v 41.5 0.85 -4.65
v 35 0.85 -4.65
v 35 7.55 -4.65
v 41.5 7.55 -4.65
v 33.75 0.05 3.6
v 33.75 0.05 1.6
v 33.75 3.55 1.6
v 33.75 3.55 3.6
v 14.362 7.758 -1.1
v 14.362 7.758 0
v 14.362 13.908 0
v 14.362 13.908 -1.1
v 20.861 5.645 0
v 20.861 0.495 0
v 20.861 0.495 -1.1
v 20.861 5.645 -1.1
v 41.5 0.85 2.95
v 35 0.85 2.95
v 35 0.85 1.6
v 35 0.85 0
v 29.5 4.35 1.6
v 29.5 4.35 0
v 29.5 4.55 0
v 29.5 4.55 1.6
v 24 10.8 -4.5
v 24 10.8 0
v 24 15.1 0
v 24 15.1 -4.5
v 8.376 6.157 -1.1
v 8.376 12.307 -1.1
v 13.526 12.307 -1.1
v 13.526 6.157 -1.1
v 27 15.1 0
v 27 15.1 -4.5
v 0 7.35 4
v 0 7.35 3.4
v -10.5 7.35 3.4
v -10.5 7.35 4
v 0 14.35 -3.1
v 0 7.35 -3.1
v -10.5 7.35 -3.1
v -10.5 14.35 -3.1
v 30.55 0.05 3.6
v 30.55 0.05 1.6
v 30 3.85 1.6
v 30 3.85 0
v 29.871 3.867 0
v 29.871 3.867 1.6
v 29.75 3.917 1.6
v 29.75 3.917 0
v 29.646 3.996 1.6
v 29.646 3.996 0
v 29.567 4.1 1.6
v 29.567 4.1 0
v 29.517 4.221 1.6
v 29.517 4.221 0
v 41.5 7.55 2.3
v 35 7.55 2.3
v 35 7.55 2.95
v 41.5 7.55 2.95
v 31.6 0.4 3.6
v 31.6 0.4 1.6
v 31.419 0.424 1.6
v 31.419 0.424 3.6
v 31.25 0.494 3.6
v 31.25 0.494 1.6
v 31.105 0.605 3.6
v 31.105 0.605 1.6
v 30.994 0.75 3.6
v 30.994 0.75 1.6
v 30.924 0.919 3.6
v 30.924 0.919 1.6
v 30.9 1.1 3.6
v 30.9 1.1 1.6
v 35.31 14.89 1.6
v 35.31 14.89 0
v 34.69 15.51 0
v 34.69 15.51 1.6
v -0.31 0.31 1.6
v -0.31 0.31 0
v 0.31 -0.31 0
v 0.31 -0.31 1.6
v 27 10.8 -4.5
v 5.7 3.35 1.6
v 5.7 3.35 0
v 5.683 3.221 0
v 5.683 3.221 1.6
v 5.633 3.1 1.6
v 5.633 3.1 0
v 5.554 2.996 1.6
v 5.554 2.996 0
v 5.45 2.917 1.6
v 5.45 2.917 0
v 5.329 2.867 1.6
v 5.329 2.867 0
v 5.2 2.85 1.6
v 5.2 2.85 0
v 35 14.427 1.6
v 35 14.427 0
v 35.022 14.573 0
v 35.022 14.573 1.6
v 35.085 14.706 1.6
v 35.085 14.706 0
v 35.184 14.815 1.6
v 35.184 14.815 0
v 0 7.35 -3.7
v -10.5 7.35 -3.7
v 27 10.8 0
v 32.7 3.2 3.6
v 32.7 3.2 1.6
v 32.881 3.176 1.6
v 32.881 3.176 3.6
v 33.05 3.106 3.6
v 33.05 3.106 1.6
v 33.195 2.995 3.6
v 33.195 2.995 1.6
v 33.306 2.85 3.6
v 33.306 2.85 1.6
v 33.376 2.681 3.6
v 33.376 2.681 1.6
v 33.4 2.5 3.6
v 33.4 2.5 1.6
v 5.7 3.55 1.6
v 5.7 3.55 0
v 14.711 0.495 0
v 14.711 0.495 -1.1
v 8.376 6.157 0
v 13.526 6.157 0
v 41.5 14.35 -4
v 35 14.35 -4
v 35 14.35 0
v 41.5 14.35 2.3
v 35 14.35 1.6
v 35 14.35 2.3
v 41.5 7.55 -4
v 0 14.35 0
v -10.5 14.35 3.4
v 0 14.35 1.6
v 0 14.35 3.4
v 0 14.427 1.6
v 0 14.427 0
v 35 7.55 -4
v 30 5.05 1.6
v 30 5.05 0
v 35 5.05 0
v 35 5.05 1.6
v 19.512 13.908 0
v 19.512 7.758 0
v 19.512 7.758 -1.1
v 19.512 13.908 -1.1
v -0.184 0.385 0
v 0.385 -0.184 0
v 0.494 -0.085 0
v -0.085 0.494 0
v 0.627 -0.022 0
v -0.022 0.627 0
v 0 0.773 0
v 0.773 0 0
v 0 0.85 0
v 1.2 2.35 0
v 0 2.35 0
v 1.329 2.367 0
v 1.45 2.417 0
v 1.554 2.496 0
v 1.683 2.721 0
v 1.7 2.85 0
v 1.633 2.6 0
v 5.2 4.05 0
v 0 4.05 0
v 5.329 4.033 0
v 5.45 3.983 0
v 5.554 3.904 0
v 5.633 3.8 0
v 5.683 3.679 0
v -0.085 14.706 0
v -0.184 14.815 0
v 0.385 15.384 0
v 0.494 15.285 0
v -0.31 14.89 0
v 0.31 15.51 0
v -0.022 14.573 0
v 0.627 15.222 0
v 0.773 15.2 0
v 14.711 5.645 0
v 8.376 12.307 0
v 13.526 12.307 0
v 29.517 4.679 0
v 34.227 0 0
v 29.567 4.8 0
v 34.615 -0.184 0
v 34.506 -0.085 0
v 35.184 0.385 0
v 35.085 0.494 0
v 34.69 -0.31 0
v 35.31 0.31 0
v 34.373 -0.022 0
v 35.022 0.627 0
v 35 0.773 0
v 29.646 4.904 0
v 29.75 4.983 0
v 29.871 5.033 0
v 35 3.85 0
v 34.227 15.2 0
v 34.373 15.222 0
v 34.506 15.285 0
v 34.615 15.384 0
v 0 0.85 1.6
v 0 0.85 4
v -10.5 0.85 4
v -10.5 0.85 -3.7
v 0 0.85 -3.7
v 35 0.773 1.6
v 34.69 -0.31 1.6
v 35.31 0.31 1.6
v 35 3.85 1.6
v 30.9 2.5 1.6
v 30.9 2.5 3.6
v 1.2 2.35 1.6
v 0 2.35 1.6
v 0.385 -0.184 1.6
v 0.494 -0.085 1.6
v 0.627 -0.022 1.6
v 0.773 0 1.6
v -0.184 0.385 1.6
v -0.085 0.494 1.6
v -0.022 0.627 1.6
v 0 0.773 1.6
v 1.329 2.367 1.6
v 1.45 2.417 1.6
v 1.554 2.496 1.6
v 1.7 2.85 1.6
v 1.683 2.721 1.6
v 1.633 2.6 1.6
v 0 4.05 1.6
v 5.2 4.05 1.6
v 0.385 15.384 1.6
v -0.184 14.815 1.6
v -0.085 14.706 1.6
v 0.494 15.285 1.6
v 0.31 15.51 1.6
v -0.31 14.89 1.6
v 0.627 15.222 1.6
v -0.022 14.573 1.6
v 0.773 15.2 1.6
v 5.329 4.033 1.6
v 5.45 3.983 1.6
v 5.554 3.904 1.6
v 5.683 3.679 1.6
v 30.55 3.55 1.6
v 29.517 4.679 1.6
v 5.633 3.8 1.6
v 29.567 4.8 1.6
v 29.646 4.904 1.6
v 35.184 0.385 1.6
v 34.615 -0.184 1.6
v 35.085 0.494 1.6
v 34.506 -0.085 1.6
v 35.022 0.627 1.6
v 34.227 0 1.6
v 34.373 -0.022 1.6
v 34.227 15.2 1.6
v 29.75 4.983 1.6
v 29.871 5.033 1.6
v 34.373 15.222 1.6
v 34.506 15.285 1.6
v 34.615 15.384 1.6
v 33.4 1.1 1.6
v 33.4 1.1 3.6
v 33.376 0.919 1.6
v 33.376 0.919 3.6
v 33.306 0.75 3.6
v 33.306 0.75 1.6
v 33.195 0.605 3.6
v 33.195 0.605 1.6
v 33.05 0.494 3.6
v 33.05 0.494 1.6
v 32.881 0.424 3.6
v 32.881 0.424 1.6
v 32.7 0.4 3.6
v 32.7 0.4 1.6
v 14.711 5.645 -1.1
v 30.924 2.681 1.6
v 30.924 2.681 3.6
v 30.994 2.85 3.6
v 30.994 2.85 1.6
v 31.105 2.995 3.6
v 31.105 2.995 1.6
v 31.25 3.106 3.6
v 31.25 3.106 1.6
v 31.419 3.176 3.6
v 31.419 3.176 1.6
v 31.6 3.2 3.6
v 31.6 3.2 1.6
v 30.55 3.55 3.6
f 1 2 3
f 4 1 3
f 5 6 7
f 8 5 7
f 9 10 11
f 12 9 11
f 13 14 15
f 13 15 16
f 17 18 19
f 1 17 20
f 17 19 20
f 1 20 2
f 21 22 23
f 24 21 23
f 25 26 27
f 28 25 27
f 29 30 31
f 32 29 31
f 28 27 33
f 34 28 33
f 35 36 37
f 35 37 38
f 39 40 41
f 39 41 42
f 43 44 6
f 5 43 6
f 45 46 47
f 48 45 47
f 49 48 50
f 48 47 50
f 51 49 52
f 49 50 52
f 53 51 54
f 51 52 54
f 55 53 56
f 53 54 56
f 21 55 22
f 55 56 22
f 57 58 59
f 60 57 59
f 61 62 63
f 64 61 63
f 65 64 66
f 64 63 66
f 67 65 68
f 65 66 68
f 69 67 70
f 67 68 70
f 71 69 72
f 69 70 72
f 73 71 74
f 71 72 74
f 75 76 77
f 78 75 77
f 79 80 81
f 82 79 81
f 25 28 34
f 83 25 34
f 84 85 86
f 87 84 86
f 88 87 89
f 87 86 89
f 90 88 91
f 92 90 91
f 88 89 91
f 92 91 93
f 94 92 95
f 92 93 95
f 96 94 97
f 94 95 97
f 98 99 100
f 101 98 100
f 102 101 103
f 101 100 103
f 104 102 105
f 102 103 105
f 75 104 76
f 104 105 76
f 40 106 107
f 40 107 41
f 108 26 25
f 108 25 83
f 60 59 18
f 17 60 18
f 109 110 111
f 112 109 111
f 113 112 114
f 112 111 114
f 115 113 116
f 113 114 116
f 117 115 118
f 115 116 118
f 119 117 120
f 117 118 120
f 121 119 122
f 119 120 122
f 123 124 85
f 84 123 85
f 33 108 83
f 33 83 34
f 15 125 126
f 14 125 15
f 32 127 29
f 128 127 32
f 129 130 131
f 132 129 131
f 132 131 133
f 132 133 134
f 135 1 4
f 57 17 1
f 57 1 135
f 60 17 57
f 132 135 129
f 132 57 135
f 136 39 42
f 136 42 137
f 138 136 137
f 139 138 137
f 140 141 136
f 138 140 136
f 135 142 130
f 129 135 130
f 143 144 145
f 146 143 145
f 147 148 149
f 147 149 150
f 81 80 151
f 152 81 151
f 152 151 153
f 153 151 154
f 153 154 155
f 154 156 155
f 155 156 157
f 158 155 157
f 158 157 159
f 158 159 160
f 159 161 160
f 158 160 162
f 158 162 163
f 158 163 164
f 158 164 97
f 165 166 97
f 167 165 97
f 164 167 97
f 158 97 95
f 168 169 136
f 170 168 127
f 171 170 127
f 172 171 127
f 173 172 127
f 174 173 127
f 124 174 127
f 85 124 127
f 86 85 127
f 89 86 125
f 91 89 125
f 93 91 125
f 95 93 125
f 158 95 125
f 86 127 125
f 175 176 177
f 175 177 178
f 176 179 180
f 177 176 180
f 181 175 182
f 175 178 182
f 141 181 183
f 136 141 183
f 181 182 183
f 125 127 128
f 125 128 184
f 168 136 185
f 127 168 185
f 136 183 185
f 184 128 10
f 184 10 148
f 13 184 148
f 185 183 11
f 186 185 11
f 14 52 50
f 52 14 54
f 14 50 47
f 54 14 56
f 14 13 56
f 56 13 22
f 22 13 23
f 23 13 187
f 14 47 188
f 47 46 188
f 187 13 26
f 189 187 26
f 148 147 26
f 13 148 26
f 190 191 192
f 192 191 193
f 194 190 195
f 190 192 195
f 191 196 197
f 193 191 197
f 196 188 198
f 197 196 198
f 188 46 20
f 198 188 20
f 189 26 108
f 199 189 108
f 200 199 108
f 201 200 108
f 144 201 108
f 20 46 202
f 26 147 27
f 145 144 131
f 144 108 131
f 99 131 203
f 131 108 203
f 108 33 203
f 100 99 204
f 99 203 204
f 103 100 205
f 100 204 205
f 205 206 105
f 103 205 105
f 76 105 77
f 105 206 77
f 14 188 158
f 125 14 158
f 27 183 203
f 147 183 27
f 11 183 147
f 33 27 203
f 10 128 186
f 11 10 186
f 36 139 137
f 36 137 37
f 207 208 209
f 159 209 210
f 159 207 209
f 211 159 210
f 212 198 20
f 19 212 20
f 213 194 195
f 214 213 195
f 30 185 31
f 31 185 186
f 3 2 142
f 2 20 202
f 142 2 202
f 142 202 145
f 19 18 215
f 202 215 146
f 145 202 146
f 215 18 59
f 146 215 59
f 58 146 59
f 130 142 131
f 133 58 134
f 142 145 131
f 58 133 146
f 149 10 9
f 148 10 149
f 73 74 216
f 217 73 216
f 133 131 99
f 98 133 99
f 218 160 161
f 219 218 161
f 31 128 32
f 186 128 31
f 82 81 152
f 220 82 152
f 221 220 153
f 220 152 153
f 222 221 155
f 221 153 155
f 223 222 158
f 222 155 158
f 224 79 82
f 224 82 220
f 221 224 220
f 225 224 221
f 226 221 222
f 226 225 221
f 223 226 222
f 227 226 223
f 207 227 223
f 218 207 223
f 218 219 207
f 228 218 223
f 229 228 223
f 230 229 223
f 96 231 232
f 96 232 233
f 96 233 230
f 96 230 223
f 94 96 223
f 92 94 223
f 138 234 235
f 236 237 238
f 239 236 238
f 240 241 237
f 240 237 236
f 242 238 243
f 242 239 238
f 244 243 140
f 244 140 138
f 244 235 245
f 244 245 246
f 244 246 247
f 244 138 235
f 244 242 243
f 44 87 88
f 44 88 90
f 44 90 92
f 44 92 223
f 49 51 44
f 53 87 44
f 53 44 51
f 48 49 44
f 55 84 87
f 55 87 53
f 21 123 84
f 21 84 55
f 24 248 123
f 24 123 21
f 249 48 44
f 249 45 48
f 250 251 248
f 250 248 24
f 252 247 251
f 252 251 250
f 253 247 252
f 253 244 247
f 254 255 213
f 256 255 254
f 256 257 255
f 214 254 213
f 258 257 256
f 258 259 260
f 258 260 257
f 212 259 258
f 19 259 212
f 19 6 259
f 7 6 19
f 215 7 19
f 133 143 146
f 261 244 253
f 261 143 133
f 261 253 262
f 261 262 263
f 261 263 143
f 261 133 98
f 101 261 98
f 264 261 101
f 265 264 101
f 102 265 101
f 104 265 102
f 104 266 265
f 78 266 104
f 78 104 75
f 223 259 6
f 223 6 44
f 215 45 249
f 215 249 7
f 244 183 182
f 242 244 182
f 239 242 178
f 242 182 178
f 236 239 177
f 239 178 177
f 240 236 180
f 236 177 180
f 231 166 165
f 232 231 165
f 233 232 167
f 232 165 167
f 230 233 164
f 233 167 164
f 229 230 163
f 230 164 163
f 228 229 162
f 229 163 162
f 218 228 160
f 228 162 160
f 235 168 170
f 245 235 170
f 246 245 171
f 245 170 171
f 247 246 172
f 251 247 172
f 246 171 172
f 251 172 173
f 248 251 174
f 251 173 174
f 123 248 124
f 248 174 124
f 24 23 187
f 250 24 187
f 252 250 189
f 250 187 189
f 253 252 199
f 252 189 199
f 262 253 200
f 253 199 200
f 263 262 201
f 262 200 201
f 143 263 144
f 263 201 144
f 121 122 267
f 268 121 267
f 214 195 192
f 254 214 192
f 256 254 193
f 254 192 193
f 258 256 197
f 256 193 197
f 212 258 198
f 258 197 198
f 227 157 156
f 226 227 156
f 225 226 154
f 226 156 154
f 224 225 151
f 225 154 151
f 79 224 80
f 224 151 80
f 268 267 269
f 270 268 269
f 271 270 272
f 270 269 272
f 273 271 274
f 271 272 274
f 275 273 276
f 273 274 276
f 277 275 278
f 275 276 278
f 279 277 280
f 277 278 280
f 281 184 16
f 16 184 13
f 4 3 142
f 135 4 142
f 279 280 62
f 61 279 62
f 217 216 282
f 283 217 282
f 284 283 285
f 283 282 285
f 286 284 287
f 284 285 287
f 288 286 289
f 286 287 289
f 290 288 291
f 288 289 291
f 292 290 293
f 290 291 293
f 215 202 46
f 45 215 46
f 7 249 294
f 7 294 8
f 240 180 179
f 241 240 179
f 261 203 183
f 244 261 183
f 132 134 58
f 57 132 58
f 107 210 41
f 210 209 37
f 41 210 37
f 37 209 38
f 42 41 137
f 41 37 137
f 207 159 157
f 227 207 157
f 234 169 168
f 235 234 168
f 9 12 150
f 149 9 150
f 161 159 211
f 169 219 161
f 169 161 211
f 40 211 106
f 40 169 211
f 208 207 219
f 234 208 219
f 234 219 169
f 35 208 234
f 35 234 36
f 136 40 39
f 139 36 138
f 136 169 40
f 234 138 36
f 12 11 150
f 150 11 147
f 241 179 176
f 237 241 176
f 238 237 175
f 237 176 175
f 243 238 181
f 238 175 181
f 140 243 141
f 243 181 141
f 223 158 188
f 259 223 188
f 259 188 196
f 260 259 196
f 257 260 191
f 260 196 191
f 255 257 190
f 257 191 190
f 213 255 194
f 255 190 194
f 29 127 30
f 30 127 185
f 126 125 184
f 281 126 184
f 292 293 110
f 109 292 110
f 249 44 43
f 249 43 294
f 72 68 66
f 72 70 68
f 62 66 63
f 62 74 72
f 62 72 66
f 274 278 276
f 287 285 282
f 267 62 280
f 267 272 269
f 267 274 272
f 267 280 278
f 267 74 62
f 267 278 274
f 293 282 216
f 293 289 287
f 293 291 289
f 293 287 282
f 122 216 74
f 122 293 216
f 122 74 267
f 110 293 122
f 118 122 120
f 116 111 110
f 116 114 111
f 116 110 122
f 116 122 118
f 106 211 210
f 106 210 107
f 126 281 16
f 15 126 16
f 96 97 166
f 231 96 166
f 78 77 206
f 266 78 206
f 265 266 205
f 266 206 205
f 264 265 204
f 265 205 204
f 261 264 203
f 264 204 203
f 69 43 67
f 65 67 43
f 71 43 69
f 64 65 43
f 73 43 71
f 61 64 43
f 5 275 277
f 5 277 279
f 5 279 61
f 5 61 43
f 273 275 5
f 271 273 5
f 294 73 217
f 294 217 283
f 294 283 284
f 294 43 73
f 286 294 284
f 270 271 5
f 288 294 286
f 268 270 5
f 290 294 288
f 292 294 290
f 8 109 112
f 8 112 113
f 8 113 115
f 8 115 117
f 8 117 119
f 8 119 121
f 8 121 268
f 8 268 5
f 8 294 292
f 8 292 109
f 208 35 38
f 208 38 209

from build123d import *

# Parameters (mm, degrees)
F1_DEPTH  = 1.6
F3_DEPTH  = 10.5
F5_START  = 35
F5_DEPTH  = 6.5
F6_W      = 3.2
F6_H      = 3.5
F7_DEPTH  = 3.6
F8_W      = 3
F8_H      = 4.3
F9_DEPTH  = 4.5
F10_W     = 5.15
F10_H     = 6.15
F10_W_2   = 6.15
F10_H_2   = 5.15
F11_DEPTH = 1.1


with BuildPart() as f1:
    # F0 (on Top) → F1 (new body)
    with BuildSketch(Plane.XY):
        with BuildLine():
            Line((1.2, 15.2), (0.7727922061, 15.2))
            ThreePointArc((0.7727922061, 15.2), (0.4943088368, 15.2847326006), (0.3102119479, 15.5102119479))
            Line((0.3102119479, 15.5102119479), (-0.3102119479, 14.8897880521))
            ThreePointArc((-0.3102119479, 14.8897880521), (-0.0847326006, 14.7056911632), (0, 14.4272077939))
            Line((0, 14.4272077939), (0, 4.05))
            Line((0, 4.05), (5.2, 4.05))
            ThreePointArc((5.2, 4.05), (5.5535533906, 3.9035533906), (5.7, 3.55))
            Line((5.7, 3.55), (5.7, 3.35))
            ThreePointArc((5.7, 3.35), (5.5535533906, 2.9964466094), (5.2, 2.85))
            Line((5.2, 2.85), (1.7, 2.85))
            ThreePointArc((1.7, 2.85), (1.5535533906, 2.4964466094), (1.2, 2.35))
            Line((1.2, 2.35), (0, 2.35))
            Line((0, 2.35), (0, 0.7727922061))
            ThreePointArc((0, 0.7727922061), (-0.0847326006, 0.4943088368), (-0.3102119479, 0.3102119479))
            Line((-0.3102119479, 0.3102119479), (0.3102119479, -0.3102119479))
            ThreePointArc((0.3102119479, -0.3102119479), (0.4943088368, -0.0847326006), (0.7727922061, 0))
            Line((0.7727922061, 0), (1.2, 0))
            Line((1.2, 0), (33.8, 0))
            Line((33.8, 0), (34.2272077939, 0))
            ThreePointArc((34.2272077939, 0), (34.5056911632, -0.0847326006), (34.6897880521, -0.3102119479))
            Line((34.6897880521, -0.3102119479), (35.3102119479, 0.3102119479))
            ThreePointArc((35.3102119479, 0.3102119479), (35.0847326006, 0.4943088368), (35, 0.7727922061))
            Line((35, 0.7727922061), (35, 3.85))
            Line((35, 3.85), (30, 3.85))
            ThreePointArc((30, 3.85), (29.6464466094, 3.9964466094), (29.5, 4.35))
            Line((29.5, 4.35), (29.5, 4.55))
            ThreePointArc((29.5, 4.55), (29.6464466094, 4.9035533906), (30, 5.05))
            Line((30, 5.05), (35, 5.05))
            Line((35, 5.05), (35, 14.4272077939))
            ThreePointArc((35, 14.4272077939), (35.0847326006, 14.7056911632), (35.3102119479, 14.8897880521))
            Line((35.3102119479, 14.8897880521), (34.6897880521, 15.5102119479))
            ThreePointArc((34.6897880521, 15.5102119479), (34.5056911632, 15.2847326006), (34.2272077939, 15.2))
            Line((34.2272077939, 15.2), (33.8, 15.2))
            Line((33.8, 15.2), (1.2, 15.2))
        make_face()
    extrude(amount=F1_DEPTH)

    # F2 (on Right) → F3 (join)
    with BuildSketch(Plane.YZ):
        Polygon((7.35, 4), (0.85, 4), (0.85, -3.7), (7.35, -3.7), (7.35, -3.1), (14.35, -3.1), (14.35, 3.4), (7.35, 3.4), align=None)
    extrude(amount=-F3_DEPTH)

    # F4 (on Right) → F5 (join)
    with BuildSketch(Plane.YZ.offset(F5_START)):
        Polygon((7.55, 2.95), (0.85, 2.95), (0.85, -4.65), (7.55, -4.65), (7.55, -4), (14.35, -4), (14.35, 2.3), (7.55, 2.3), align=None)
    extrude(amount=F5_DEPTH)

    # F6 (on Top) → F7 (join)
    with BuildSketch(Plane.XY):
        with Locations((32.15, 1.8)):
            Rectangle(F6_W, F6_H)
        with BuildLine():
            ThreePointArc((30.9, 2.5), (31.1050252532, 2.9949747468), (31.6, 3.2))
            Line((31.6, 3.2), (32.7, 3.2))
            ThreePointArc((32.7, 3.2), (33.1949747468, 2.9949747468), (33.4, 2.5))
            Line((33.4, 2.5), (33.4, 1.1))
            ThreePointArc((33.4, 1.1), (33.1949747468, 0.6050252532), (32.7, 0.4))
            Line((32.7, 0.4), (31.6, 0.4))
            ThreePointArc((31.6, 0.4), (31.1050252532, 0.6050252532), (30.9, 1.1))
            Line((30.9, 1.1), (30.9, 2.5))
        make_face(mode=Mode.SUBTRACT)
    extrude(amount=F7_DEPTH)

    # F8 (on Top) → F9 (join)
    with BuildSketch(Plane.XY):
        with Locations((25.5, 12.95)):
            Rectangle(F8_W, F8_H)
    extrude(amount=-F9_DEPTH)

    # F10 (on Top) → F11 (join)
    with BuildSketch(Plane.XY):
        with Locations((10.9508251641, 9.2315472887)):
            Rectangle(F10_W, F10_H)
        with Locations((16.9374256049, 10.8333893863)):
            Rectangle(F10_W, F10_H)
        with Locations((17.7855274571, 3.0699999196)):
            Rectangle(F10_W_2, F10_H_2)
    extrude(amount=-F11_DEPTH)


solid = f1.part
